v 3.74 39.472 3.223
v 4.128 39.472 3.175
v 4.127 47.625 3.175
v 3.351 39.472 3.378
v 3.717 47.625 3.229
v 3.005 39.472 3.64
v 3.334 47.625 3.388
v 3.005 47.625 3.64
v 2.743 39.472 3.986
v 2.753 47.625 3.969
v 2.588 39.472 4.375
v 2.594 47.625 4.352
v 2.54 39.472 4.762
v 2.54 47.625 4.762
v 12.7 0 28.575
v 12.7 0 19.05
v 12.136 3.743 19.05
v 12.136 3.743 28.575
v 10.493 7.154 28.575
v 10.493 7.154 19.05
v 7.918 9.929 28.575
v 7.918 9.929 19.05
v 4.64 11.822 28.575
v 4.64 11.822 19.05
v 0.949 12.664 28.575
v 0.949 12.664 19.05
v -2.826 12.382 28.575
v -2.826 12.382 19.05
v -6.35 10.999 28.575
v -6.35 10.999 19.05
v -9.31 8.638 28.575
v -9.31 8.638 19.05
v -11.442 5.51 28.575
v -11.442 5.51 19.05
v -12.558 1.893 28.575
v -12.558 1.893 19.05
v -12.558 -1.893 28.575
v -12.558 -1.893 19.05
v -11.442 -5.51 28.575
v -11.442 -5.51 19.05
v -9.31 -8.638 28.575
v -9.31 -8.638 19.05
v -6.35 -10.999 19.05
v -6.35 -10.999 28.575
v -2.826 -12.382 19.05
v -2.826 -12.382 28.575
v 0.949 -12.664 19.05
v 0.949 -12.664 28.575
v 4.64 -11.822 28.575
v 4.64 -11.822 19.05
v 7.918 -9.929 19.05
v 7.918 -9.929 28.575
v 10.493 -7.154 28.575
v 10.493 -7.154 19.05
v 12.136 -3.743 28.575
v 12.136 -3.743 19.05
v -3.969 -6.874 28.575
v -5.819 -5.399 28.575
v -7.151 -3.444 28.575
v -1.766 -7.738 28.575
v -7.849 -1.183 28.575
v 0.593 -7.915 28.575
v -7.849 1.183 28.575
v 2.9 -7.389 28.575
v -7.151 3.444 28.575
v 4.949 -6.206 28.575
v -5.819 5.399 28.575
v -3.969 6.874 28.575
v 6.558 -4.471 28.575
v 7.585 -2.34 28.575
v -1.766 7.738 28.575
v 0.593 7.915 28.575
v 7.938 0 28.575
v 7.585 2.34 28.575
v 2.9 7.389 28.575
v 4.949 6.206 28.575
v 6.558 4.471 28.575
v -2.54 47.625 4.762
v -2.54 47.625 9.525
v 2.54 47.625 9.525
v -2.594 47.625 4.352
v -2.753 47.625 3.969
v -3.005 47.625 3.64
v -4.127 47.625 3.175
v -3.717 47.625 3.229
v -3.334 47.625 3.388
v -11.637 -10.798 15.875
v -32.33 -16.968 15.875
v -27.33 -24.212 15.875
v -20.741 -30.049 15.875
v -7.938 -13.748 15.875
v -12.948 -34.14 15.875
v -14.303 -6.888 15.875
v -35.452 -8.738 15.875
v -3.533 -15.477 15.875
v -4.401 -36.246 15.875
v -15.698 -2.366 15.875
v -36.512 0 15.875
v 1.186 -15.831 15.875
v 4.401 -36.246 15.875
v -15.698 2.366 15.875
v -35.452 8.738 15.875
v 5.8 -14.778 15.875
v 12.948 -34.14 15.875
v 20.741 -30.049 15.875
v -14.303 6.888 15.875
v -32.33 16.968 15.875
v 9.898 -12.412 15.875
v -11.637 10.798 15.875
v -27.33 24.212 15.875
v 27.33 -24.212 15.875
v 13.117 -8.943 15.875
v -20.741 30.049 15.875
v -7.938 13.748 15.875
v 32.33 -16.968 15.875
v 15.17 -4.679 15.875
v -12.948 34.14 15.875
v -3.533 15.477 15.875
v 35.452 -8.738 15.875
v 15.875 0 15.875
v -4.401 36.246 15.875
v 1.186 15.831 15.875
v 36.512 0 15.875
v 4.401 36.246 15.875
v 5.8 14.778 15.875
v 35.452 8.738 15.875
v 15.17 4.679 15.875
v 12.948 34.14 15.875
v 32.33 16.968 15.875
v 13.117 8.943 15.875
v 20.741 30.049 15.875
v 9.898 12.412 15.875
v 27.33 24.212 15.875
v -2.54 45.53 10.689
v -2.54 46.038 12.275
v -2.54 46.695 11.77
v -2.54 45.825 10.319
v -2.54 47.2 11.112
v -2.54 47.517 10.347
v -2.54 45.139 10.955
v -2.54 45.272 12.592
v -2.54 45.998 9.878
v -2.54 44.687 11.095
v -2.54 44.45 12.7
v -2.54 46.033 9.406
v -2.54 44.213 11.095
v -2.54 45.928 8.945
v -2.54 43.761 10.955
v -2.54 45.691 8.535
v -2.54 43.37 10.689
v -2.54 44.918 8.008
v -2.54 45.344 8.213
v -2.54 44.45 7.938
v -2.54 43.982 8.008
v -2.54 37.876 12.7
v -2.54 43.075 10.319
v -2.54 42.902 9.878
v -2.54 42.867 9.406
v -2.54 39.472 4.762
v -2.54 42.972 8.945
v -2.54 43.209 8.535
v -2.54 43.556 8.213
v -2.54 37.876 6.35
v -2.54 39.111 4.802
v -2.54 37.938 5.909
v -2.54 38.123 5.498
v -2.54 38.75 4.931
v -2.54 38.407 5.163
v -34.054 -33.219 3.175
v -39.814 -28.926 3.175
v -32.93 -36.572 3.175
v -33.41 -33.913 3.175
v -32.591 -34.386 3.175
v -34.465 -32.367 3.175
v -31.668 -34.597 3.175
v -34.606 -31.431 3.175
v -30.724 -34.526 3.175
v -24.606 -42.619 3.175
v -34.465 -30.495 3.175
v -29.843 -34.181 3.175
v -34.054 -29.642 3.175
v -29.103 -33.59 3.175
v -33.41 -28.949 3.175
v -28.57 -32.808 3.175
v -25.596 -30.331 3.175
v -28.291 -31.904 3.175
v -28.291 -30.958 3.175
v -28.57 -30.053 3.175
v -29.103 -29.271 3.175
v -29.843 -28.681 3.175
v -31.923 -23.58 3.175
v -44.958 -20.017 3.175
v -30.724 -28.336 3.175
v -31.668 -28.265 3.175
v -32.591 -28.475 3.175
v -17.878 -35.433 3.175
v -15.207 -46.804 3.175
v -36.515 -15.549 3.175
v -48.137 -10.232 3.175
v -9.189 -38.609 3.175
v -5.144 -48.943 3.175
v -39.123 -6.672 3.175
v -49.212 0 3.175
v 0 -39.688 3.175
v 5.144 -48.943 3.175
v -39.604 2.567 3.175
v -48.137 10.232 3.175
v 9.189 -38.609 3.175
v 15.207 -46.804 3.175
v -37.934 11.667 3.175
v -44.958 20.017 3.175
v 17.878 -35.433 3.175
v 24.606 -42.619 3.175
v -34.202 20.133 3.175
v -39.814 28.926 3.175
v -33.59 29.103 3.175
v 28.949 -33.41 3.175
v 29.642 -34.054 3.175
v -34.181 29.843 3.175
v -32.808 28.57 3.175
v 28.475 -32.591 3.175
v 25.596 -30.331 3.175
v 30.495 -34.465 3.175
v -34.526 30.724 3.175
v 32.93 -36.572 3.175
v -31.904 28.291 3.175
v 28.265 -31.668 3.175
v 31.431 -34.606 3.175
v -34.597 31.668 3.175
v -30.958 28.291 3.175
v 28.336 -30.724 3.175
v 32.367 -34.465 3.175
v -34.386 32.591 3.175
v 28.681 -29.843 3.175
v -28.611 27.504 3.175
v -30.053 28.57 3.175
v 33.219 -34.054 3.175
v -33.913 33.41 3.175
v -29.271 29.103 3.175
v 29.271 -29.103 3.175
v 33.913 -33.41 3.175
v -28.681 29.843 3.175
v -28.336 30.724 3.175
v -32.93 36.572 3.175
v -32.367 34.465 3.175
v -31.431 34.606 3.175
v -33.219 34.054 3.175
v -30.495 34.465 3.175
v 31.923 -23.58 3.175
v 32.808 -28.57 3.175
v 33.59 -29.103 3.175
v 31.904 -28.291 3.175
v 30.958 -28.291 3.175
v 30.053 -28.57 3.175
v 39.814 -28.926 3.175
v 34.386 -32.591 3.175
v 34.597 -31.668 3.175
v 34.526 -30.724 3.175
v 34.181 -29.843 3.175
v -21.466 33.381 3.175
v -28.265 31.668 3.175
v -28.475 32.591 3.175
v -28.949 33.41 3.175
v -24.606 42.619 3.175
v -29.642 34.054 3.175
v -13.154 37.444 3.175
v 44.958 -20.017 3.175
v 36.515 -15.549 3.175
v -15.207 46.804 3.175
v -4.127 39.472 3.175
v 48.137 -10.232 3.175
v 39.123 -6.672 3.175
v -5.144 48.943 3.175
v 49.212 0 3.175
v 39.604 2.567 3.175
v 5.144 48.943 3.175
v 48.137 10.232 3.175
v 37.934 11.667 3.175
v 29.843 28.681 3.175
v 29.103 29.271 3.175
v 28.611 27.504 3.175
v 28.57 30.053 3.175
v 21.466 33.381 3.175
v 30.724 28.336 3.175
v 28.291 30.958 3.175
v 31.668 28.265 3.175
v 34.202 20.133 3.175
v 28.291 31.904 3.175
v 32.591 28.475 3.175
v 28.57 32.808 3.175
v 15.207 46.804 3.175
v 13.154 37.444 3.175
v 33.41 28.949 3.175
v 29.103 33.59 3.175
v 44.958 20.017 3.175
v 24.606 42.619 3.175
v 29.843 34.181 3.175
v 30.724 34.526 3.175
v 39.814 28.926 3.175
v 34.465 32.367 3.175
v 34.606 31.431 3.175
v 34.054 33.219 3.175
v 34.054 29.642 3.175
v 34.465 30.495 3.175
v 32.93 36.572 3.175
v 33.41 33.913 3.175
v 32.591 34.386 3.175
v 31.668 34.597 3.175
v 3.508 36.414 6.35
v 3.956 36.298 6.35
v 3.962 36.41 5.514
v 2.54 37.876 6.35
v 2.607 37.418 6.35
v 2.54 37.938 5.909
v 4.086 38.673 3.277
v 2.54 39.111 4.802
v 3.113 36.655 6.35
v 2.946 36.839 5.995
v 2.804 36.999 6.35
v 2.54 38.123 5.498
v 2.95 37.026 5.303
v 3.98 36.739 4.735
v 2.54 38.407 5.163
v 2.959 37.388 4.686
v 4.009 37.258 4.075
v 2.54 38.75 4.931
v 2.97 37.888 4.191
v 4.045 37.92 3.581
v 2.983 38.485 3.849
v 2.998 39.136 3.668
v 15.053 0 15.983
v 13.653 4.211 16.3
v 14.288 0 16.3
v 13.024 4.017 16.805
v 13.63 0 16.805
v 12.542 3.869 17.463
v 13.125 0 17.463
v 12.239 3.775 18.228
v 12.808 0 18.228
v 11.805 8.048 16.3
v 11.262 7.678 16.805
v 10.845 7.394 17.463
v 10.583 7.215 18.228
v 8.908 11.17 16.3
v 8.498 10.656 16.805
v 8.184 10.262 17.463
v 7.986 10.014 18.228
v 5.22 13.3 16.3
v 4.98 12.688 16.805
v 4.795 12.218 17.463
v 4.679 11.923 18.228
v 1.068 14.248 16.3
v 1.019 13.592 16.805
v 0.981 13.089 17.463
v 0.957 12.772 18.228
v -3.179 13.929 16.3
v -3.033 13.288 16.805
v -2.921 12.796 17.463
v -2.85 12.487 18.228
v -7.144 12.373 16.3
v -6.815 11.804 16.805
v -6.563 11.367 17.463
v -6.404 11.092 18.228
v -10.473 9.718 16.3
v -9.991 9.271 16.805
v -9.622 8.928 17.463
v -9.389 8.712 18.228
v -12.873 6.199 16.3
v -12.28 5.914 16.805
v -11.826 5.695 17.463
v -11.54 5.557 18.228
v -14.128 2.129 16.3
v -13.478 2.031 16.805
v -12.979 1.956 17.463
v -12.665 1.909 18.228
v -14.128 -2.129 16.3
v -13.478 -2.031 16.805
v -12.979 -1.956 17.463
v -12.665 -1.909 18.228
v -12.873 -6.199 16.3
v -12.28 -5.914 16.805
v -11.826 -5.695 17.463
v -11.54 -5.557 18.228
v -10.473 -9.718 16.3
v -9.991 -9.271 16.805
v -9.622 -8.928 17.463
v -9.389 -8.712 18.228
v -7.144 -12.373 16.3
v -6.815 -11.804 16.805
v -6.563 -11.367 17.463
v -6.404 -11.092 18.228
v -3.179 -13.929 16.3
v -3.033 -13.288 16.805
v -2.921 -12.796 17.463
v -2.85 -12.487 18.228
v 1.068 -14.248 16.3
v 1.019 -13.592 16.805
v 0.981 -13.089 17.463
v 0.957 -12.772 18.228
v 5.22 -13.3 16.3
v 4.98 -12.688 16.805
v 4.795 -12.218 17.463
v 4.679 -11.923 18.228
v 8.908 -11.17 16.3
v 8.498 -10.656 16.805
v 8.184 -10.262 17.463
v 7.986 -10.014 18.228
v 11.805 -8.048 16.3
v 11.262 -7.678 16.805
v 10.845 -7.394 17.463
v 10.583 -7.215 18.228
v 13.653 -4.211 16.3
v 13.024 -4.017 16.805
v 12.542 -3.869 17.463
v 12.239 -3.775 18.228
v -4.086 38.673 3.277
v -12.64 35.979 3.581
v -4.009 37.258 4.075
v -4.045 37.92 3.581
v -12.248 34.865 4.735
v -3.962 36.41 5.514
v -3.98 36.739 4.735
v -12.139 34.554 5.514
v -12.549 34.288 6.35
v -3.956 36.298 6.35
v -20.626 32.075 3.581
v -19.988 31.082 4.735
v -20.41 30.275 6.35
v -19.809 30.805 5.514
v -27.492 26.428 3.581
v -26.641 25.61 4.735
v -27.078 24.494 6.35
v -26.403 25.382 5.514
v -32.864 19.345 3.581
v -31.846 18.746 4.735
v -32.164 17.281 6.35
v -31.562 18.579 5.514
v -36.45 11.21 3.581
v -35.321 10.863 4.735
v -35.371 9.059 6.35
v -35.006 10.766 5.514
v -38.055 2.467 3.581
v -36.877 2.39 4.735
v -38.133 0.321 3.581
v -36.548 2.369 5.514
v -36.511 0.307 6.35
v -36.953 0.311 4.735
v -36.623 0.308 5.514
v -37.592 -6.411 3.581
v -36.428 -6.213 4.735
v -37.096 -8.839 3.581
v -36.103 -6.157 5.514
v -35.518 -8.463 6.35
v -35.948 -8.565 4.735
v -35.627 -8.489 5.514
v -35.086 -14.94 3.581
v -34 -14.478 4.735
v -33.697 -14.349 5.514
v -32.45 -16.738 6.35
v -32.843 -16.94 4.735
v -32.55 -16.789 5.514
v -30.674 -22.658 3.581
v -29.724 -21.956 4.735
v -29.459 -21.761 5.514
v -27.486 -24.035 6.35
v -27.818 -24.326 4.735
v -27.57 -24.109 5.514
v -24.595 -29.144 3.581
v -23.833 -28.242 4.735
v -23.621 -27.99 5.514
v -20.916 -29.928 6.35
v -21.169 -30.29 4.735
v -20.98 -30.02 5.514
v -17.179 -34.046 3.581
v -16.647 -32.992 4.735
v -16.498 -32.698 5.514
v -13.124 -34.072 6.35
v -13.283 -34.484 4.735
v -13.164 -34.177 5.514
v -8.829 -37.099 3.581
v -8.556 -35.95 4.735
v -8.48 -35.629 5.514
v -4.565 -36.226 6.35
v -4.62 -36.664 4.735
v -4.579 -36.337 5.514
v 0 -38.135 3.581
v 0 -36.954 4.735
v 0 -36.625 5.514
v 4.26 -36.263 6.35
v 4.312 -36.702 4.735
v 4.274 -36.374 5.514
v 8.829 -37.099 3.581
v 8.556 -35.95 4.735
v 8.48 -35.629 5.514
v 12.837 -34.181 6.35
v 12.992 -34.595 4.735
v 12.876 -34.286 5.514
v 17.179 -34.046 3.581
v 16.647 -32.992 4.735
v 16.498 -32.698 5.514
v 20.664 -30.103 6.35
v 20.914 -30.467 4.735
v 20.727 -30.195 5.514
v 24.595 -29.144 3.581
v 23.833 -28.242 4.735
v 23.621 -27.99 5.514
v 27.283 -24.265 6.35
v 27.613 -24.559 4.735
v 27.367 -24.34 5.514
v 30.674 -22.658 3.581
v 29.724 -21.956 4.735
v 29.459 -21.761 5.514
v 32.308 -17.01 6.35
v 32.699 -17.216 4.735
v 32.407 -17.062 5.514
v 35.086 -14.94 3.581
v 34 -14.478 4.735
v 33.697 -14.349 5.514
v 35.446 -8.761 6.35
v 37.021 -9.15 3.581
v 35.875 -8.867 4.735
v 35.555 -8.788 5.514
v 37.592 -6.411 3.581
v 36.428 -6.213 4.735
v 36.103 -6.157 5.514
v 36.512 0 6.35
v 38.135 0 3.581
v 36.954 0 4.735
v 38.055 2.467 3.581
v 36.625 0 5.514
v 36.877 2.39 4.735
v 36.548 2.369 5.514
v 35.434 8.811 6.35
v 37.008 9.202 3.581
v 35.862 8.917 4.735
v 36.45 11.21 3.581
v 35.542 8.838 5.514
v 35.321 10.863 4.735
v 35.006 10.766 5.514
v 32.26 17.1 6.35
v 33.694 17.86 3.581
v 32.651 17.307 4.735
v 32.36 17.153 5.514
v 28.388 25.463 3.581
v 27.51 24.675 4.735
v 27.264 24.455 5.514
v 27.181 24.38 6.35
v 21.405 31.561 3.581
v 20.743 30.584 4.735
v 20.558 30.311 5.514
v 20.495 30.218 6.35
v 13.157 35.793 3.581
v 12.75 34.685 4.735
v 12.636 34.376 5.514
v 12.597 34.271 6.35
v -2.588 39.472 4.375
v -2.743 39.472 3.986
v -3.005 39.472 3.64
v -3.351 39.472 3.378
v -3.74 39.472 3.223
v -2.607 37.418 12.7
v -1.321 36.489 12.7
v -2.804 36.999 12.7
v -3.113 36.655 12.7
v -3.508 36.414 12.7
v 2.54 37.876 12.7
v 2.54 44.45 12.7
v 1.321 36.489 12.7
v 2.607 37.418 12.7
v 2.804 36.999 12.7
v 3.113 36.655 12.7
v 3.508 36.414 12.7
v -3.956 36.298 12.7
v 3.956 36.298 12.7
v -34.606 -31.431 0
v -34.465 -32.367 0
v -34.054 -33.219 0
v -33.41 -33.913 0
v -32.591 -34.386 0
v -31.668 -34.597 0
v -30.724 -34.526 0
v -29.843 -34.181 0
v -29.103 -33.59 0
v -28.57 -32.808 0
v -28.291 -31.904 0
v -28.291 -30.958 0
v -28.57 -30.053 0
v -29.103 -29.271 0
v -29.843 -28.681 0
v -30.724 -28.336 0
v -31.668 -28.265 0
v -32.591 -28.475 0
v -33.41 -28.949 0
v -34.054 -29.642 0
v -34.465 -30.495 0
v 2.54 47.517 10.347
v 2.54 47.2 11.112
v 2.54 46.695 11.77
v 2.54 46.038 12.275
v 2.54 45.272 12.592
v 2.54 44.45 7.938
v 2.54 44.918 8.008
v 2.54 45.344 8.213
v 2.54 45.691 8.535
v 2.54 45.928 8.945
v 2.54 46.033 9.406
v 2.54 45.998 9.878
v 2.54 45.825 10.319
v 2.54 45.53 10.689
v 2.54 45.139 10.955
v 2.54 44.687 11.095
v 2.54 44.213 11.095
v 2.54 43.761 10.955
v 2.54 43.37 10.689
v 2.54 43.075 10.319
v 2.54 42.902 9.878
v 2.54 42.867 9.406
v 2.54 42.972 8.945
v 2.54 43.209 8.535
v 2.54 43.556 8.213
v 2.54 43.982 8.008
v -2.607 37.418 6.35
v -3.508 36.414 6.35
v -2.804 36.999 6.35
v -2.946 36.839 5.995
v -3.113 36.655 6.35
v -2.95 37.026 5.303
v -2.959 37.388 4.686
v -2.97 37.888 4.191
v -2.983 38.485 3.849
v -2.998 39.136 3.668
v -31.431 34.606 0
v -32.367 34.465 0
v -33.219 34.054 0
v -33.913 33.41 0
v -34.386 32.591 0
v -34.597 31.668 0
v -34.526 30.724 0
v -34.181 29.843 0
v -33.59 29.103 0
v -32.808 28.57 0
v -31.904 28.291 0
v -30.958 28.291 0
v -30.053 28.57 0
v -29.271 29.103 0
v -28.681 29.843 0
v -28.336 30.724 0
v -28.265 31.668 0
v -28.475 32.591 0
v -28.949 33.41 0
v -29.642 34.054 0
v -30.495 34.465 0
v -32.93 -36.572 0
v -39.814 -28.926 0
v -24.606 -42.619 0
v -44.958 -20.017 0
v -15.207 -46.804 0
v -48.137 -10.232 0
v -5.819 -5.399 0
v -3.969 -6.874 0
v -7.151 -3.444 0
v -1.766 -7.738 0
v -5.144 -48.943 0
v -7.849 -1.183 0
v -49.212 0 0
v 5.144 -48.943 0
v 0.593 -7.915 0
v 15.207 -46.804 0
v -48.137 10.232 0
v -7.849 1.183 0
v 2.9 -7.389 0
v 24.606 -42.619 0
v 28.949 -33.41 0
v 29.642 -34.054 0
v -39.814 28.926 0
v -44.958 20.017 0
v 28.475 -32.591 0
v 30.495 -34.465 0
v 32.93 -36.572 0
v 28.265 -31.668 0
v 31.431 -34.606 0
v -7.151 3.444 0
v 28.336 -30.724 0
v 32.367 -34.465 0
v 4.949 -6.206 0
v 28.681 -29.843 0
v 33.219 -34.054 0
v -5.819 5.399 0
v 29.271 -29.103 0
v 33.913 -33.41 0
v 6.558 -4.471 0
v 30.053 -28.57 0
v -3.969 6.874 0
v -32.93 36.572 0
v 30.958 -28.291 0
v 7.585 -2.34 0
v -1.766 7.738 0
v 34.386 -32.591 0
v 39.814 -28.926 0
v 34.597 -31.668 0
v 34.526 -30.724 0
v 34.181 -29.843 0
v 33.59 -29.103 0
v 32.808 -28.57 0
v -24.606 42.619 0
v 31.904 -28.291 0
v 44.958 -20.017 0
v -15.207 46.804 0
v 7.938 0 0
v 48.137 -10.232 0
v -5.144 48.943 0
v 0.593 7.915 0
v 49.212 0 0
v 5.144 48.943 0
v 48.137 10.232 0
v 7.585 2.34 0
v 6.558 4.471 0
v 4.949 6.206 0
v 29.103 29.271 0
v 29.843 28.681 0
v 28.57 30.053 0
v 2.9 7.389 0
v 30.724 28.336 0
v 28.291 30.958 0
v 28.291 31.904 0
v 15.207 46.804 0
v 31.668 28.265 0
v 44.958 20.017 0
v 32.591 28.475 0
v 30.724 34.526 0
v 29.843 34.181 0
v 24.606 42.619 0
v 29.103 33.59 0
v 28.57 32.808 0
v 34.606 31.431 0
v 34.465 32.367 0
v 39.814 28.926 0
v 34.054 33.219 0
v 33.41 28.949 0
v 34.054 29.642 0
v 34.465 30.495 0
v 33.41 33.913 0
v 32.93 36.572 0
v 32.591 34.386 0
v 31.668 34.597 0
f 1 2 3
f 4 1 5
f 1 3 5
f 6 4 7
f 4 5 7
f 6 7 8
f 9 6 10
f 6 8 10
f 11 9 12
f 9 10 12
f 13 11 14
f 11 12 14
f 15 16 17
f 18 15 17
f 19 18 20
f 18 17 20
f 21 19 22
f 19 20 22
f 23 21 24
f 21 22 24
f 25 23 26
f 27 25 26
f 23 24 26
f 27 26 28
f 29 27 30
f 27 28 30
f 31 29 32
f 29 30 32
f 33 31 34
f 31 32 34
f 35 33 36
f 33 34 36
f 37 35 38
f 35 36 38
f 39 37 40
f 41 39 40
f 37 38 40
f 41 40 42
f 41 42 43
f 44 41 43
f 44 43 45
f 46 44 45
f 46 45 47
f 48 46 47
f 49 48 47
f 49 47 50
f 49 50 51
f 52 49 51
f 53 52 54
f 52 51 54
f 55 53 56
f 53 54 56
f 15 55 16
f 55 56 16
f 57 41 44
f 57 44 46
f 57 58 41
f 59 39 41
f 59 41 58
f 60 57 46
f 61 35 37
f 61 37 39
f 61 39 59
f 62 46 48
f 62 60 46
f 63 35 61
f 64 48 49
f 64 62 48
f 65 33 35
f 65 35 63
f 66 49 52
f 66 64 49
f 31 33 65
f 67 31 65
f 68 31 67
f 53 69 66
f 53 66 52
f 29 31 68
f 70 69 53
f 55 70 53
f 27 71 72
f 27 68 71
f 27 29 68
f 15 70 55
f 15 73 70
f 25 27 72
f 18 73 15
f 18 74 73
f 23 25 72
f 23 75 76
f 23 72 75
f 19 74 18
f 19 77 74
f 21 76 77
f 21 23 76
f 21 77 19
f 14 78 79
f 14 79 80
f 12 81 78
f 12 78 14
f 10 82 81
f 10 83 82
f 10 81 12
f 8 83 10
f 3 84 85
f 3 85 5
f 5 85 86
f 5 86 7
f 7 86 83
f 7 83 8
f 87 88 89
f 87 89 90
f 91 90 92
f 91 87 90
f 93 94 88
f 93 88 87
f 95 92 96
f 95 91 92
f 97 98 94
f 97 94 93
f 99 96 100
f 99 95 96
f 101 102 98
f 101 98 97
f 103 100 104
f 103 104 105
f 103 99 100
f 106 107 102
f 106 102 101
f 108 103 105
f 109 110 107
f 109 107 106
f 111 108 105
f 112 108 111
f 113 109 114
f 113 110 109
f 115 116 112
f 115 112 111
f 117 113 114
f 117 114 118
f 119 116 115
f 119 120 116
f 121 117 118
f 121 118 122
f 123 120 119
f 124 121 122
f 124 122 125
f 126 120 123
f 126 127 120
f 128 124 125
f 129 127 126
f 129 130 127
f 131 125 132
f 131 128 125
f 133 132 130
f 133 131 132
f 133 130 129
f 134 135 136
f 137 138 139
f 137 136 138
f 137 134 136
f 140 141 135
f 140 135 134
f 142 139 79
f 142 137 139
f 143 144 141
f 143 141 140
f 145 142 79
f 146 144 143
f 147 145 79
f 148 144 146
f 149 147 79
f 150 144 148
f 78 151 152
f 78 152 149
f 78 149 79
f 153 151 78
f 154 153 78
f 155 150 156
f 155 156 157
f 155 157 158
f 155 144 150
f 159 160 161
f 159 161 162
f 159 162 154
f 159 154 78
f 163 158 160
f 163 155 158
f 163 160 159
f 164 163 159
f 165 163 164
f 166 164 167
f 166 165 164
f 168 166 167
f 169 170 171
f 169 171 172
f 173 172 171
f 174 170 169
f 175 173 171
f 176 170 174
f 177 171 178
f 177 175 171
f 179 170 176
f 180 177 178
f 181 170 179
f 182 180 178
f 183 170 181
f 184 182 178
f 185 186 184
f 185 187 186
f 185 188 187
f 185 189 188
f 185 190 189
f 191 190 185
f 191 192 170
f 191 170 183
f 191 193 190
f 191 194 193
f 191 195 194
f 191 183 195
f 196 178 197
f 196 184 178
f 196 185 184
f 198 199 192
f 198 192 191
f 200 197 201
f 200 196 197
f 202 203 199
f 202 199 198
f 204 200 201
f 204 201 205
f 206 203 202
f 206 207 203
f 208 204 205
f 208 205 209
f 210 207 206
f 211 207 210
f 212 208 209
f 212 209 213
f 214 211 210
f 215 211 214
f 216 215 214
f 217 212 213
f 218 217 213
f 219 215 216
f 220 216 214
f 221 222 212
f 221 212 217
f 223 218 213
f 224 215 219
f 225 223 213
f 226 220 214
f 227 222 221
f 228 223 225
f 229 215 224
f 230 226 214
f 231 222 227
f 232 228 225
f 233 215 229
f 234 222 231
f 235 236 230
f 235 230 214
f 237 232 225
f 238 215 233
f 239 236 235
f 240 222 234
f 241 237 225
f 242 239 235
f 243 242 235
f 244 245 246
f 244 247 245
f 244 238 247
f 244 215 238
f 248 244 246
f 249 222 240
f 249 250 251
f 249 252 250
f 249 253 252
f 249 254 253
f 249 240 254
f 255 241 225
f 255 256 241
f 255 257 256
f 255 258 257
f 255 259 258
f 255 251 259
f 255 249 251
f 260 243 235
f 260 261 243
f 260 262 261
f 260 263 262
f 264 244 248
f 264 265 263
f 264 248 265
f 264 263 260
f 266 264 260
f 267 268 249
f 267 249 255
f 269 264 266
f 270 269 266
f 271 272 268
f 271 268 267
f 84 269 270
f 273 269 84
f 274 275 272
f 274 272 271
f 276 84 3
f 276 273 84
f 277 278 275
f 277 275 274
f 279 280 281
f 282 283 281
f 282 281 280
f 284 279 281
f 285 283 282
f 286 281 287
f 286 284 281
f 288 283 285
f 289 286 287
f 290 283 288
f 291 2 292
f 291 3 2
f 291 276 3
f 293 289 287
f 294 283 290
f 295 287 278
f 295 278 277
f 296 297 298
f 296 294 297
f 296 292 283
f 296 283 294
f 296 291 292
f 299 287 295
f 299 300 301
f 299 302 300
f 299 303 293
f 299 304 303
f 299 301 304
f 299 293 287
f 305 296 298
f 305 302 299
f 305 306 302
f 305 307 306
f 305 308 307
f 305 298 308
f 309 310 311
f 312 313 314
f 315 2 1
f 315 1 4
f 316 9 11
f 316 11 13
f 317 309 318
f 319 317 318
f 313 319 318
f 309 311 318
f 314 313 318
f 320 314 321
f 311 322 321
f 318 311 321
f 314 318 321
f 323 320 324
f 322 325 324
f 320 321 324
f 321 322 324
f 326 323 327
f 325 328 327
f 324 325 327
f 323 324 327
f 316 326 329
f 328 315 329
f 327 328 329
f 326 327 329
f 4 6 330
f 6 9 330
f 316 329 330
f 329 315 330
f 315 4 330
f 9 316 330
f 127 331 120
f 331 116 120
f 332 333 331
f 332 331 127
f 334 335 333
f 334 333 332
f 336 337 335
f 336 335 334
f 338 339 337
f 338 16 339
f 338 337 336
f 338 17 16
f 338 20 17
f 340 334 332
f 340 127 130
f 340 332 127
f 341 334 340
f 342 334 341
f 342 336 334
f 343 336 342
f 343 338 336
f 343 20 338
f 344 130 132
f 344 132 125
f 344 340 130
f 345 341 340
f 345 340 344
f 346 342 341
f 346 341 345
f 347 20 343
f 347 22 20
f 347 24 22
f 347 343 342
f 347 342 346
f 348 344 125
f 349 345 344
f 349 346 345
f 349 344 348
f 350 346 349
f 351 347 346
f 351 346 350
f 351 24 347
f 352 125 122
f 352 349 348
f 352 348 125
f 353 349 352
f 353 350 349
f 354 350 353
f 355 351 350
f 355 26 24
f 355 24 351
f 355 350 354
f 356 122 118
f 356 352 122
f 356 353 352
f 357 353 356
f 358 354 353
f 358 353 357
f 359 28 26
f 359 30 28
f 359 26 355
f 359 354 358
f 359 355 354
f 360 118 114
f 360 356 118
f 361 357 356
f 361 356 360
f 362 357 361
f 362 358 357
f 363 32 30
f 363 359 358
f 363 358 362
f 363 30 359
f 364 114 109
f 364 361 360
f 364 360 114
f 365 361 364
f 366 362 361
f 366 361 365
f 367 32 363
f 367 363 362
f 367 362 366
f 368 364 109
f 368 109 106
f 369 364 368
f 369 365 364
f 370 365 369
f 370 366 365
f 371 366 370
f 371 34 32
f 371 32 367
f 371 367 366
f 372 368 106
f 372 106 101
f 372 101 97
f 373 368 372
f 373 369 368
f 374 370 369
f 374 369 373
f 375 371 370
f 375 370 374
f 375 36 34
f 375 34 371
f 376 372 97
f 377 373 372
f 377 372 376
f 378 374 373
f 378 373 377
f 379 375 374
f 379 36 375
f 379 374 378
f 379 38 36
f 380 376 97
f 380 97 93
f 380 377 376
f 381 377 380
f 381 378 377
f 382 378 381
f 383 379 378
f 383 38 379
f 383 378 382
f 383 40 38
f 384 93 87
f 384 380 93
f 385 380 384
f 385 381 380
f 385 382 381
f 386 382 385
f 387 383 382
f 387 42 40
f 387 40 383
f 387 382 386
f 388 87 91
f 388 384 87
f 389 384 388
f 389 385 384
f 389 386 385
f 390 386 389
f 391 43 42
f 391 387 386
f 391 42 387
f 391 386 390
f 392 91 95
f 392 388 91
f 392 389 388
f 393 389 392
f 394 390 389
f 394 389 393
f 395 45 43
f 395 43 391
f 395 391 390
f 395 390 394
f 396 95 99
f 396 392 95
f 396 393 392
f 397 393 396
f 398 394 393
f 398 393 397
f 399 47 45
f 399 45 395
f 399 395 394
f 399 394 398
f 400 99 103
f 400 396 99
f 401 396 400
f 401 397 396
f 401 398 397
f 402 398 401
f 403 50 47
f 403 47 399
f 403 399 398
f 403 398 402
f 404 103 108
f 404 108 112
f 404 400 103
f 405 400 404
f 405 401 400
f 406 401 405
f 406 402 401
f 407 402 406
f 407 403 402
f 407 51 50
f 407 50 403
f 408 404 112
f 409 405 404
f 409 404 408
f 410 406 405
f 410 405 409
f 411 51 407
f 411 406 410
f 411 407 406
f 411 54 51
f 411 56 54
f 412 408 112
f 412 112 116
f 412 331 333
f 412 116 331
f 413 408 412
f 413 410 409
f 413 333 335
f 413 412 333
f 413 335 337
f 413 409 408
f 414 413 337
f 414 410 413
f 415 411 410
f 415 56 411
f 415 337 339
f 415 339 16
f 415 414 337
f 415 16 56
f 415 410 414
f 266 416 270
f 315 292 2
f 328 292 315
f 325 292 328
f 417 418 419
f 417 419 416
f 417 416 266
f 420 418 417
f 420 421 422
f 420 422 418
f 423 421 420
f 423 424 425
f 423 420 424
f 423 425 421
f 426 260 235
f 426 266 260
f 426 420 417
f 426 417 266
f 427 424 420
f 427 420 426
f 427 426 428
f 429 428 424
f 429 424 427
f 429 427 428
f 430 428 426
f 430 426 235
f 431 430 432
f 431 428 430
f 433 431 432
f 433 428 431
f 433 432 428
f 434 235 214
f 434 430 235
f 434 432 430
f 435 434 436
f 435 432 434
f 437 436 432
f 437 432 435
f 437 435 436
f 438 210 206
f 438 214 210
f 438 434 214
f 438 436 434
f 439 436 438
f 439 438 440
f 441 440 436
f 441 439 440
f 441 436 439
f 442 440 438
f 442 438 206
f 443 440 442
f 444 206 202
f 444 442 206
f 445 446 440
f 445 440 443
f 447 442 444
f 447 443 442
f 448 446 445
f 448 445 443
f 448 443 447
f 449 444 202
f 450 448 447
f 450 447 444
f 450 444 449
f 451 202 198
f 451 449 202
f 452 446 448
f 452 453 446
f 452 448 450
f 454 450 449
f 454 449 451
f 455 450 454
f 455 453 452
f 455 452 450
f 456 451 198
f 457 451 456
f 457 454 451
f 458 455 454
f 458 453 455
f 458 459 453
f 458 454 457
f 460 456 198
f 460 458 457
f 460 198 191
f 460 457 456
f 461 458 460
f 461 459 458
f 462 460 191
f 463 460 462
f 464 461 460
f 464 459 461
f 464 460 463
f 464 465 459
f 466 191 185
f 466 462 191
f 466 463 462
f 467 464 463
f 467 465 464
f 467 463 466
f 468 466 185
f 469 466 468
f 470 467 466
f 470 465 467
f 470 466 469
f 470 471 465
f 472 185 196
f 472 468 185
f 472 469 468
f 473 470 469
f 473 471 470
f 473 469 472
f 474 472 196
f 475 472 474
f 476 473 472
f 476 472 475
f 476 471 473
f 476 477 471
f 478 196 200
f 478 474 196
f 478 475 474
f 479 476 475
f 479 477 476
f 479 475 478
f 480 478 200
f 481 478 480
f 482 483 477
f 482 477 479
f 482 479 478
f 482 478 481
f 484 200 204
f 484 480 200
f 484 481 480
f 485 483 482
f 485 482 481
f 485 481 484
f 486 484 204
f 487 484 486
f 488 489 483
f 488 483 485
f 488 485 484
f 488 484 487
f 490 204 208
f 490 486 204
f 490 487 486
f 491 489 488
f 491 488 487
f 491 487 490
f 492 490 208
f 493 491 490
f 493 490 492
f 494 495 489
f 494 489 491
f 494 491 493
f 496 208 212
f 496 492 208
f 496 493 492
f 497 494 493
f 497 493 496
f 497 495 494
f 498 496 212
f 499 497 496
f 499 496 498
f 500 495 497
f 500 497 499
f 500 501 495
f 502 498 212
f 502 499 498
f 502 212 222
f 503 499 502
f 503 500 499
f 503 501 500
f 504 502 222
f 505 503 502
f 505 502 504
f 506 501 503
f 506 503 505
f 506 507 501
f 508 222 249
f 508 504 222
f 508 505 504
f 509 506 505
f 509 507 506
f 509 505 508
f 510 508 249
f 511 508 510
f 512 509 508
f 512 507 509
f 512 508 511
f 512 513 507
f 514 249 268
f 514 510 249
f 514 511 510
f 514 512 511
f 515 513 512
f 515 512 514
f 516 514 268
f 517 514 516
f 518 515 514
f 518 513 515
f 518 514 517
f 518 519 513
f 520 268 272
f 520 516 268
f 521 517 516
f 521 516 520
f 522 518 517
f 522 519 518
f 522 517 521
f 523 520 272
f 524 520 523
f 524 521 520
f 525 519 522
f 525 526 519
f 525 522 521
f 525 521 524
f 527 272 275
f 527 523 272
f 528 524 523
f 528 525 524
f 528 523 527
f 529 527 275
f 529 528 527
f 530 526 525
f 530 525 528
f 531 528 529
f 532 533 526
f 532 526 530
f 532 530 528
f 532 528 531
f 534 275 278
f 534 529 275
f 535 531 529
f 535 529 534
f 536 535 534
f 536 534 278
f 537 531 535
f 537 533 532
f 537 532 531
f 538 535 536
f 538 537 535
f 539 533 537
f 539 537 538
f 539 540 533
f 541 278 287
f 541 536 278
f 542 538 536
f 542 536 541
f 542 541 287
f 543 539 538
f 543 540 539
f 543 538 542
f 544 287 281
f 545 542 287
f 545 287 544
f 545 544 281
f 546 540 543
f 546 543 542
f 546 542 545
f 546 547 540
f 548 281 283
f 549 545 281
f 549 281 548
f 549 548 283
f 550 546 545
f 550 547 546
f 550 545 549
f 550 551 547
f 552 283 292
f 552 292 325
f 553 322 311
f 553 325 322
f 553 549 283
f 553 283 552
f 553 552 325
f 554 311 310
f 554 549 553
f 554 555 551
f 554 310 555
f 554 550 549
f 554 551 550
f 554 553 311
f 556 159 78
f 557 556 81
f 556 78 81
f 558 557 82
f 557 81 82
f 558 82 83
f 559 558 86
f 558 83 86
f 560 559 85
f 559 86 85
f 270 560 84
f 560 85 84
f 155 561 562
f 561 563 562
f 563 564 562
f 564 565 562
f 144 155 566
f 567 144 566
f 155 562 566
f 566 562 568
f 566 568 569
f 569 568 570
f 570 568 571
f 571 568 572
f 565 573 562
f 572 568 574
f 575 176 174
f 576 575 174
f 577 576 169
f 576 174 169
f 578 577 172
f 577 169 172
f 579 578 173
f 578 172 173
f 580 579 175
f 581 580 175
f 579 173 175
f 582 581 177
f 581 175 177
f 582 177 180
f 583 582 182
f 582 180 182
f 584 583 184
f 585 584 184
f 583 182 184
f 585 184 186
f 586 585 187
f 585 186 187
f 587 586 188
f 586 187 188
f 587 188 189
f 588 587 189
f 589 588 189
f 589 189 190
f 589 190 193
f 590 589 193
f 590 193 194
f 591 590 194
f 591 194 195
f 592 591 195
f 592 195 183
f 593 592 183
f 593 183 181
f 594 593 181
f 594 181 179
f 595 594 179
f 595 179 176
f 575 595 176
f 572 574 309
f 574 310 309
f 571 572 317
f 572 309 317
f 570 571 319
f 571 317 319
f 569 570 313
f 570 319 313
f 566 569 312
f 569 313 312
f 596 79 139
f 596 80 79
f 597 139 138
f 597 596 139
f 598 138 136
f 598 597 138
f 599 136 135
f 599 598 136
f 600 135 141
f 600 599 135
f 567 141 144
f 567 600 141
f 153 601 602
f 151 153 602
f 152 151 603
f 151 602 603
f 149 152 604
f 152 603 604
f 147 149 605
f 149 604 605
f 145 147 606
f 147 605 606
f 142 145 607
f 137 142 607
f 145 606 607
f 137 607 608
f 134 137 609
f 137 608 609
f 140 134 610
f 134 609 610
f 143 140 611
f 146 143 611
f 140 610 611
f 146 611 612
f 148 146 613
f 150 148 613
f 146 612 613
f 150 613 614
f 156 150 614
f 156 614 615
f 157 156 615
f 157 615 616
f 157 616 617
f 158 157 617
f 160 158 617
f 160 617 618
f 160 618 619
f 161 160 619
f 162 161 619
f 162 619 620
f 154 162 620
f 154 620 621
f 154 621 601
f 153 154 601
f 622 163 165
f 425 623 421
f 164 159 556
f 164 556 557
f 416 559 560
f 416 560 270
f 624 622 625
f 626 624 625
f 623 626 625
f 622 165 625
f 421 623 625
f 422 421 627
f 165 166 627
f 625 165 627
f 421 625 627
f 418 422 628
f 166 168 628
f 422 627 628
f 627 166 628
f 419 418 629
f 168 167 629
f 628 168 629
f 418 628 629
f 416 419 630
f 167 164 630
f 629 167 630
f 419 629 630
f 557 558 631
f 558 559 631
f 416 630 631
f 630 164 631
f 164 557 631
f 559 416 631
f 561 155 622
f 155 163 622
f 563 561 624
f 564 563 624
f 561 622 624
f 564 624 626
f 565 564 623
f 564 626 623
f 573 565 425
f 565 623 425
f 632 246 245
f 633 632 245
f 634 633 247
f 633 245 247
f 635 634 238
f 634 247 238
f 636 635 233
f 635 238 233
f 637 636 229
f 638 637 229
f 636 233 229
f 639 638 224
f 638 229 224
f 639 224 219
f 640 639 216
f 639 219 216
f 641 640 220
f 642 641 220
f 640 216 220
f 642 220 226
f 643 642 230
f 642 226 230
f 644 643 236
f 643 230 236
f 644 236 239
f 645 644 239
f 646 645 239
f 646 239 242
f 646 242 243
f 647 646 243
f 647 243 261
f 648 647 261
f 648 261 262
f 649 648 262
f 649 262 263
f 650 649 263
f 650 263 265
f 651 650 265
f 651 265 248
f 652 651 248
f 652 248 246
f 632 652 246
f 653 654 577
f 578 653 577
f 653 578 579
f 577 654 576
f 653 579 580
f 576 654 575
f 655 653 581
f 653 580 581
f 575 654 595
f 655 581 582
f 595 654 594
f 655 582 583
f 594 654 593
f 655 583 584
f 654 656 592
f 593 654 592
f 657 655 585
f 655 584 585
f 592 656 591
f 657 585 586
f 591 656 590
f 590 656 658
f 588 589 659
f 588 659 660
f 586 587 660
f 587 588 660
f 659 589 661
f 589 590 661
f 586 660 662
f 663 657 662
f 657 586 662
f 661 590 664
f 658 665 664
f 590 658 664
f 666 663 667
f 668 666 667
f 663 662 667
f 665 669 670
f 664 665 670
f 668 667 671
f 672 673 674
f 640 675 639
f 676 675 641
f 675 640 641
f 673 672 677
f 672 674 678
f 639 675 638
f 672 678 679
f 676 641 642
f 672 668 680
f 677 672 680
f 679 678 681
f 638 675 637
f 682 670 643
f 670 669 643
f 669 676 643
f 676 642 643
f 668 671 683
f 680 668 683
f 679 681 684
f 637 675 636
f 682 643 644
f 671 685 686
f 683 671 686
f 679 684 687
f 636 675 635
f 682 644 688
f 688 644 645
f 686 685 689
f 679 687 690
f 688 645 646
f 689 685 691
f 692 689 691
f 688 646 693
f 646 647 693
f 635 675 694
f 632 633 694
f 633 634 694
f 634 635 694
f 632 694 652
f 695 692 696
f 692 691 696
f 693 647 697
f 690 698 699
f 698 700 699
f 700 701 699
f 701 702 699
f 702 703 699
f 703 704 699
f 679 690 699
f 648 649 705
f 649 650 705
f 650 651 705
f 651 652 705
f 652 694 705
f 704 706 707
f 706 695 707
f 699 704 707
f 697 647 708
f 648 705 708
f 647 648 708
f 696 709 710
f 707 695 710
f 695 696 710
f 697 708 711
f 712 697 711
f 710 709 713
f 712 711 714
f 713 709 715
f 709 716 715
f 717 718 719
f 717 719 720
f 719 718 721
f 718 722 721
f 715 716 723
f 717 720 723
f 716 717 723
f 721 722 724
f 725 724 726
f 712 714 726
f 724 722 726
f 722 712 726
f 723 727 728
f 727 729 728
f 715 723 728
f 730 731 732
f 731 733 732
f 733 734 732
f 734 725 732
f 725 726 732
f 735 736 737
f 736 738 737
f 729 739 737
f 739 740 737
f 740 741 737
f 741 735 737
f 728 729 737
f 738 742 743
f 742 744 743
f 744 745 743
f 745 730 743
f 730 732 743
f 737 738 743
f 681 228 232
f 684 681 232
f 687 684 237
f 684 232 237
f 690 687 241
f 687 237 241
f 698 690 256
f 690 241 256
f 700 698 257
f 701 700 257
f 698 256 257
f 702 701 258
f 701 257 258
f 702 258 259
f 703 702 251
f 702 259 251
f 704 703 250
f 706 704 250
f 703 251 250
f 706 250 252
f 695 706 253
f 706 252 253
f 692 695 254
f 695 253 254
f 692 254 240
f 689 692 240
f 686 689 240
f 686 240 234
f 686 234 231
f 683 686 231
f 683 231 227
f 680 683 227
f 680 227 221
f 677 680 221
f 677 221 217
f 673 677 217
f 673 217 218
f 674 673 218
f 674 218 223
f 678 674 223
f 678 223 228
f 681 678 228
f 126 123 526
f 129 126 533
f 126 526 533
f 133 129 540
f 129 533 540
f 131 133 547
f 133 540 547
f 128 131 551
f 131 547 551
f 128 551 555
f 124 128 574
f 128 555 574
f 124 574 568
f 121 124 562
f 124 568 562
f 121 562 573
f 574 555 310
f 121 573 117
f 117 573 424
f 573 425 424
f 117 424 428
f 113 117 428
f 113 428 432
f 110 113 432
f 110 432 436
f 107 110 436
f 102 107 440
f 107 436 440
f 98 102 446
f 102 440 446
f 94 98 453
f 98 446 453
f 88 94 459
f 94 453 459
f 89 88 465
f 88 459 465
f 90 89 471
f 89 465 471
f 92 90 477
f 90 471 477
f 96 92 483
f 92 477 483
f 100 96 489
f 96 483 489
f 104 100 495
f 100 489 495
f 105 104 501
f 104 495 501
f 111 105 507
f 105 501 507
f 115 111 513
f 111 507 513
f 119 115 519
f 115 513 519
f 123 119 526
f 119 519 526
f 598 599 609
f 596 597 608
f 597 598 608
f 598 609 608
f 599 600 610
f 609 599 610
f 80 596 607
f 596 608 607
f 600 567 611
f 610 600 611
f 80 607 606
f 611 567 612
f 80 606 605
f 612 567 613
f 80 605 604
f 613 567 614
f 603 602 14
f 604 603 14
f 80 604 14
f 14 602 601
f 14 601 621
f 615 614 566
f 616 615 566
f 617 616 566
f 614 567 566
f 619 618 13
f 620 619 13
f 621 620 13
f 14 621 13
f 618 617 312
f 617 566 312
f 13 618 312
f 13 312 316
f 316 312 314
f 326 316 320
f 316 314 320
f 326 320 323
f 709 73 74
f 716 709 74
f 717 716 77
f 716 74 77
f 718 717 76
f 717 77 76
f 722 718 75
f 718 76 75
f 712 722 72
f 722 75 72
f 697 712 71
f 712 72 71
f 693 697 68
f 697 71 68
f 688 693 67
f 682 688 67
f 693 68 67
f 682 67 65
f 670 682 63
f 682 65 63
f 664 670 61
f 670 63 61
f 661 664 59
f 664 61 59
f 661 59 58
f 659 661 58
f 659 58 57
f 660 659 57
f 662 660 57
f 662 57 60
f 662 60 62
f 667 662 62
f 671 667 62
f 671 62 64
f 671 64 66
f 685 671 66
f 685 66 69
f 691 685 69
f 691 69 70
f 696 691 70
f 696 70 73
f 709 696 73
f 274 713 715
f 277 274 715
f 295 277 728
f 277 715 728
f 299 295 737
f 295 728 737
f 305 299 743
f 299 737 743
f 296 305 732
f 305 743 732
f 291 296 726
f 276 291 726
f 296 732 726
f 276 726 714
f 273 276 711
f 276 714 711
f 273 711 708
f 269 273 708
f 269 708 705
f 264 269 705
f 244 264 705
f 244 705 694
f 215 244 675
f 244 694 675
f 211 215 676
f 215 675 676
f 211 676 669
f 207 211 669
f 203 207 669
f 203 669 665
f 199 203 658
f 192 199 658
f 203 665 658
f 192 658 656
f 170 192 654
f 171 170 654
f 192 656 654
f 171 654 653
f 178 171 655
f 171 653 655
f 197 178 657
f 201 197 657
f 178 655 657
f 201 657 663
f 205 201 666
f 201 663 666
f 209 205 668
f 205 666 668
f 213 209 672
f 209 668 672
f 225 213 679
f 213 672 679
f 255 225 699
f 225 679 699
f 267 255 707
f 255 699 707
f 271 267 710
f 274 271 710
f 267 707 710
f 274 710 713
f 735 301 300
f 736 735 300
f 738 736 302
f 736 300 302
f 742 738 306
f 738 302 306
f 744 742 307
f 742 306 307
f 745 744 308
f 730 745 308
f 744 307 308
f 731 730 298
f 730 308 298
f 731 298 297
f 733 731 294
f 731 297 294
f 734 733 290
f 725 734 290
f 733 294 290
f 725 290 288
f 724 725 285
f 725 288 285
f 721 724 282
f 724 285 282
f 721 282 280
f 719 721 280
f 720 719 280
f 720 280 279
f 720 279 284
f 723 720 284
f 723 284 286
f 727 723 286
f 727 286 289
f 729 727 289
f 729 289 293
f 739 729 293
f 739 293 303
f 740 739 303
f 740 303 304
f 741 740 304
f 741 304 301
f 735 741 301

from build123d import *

# Parameters (mm, degrees)
SKETCH1_R           = 49.2125
BASE_EXTRUDE_DEPTH  = 3.175
SKETCH5_R           = 3.175
CUT_EXTRUDE2_DEPTH  = 4.175
CIRPATTERN1_COUNT   = 4
SKETCH2_R           = 36.5125
BOSS_EXTRUDE1_DEPTH = 12.7
SKETCH3_R           = 12.7
BOSS_EXTRUDE2_DEPTH = 12.7
FILLET1_R           = 3.175
SKETCH6_W           = 5.08
SKETCH6_H           = 9.525
BOSS_EXTRUDE3_DEPTH = 47.625
SKETCH4_R           = 7.9375
CUT_EXTRUDE1_DEPTH  = 29.575
FILLET2_R           = 3.175
CUT_EXTRUDE3_REACH  = 53.752
SKETCH7_R           = 1.5875
FILLET3_R           = 1.5875


with BuildPart() as part:
    # Sketch1 → Base-Extrude (new body)
    with BuildSketch(Plane.XY):
        Circle(SKETCH1_R)
    extrude(amount=BASE_EXTRUDE_DEPTH)

    # Sketch5 → Cut-Extrude2 (cut, through all)
    with BuildSketch(Plane.XY.offset(3.175)):
        with Locations((31.430896424, 31.430896424)):
            Circle(SKETCH5_R)
    cut_extrude2 = extrude(amount=-CUT_EXTRUDE2_DEPTH, mode=Mode.SUBTRACT)

    # CirPattern1: Cut-Extrude2 ×4 about axis
    cirpattern1_axis = Axis((0, 0, 0), (0, 0, 1))
    for i in range(1, CIRPATTERN1_COUNT):
        add(cut_extrude2.rotate(cirpattern1_axis, i * 360 / CIRPATTERN1_COUNT), mode=Mode.SUBTRACT)

    # Sketch2 → Boss-Extrude1 (add)
    with BuildSketch(Plane.XY.offset(3.175)):
        Circle(SKETCH2_R)
    extrude(amount=BOSS_EXTRUDE1_DEPTH)

    # Sketch3 → Boss-Extrude2 (add)
    with BuildSketch(Plane.XY.offset(15.875)):
        Circle(SKETCH3_R)
    extrude(amount=BOSS_EXTRUDE2_DEPTH)

    # Fillet1
    fillet1_edges = [part.edges().sort_by_distance(p)[0] for p in [
        (-36.5125, 0, 3.175),
        (-12.7, 0, 15.875),
    ]]
    fillet(fillet1_edges, radius=FILLET1_R)

    # Sketch6 → Boss-Extrude3 (add)
    with BuildSketch(Plane(origin=(0, 0, 0), x_dir=(1, 0, 0), z_dir=(0, 1, 0))):
        with Locations((0, -7.9375)):
            Rectangle(SKETCH6_W, SKETCH6_H)
    extrude(amount=BOSS_EXTRUDE3_DEPTH)

    # Sketch4 → Cut-Extrude1 (cut, through all)
    with BuildSketch(Plane.XY.offset(28.575)):
        Circle(SKETCH4_R)
    extrude(amount=-CUT_EXTRUDE1_DEPTH, mode=Mode.SUBTRACT)

    # Fillet2
    fillet2_edges = [part.edges().sort_by_distance(p)[0] for p in [
        (0, 47.625, 12.7),
    ]]
    fillet(fillet2_edges, radius=FILLET2_R)

    # Sketch7 → Cut-Extrude3 (cut, up to next)
    with BuildSketch(Plane(origin=(2.54, 0, 0), x_dir=(0, 0, -1), z_dir=(1, 0, 0)), mode=Mode.PRIVATE) as cut_extrude3_sk1:
        with Locations((-9.525, 44.45)):
            Circle(SKETCH7_R)
    cut_extrude3_tool1 = extrude(cut_extrude3_sk1.sketch, amount=-CUT_EXTRUDE3_REACH, mode=Mode.PRIVATE) & part.part
    add(cut_extrude3_tool1.solids().sort_by_distance((2.54, 44.45, 9.525))[0], mode=Mode.SUBTRACT)

    # Fillet3
    fillet3_edges = [part.edges().sort_by_distance(p)[0] for p in [
        (-2.54, 36.424045029, 9.5249997),
        (-2.54, 43.615568299, 3.175),
        (2.54, 43.615568299, 3.175),
        (2.54, 36.424045029, 9.5249997),
    ]]
    fillet(fillet3_edges, radius=FILLET3_R)


solid = part.part
